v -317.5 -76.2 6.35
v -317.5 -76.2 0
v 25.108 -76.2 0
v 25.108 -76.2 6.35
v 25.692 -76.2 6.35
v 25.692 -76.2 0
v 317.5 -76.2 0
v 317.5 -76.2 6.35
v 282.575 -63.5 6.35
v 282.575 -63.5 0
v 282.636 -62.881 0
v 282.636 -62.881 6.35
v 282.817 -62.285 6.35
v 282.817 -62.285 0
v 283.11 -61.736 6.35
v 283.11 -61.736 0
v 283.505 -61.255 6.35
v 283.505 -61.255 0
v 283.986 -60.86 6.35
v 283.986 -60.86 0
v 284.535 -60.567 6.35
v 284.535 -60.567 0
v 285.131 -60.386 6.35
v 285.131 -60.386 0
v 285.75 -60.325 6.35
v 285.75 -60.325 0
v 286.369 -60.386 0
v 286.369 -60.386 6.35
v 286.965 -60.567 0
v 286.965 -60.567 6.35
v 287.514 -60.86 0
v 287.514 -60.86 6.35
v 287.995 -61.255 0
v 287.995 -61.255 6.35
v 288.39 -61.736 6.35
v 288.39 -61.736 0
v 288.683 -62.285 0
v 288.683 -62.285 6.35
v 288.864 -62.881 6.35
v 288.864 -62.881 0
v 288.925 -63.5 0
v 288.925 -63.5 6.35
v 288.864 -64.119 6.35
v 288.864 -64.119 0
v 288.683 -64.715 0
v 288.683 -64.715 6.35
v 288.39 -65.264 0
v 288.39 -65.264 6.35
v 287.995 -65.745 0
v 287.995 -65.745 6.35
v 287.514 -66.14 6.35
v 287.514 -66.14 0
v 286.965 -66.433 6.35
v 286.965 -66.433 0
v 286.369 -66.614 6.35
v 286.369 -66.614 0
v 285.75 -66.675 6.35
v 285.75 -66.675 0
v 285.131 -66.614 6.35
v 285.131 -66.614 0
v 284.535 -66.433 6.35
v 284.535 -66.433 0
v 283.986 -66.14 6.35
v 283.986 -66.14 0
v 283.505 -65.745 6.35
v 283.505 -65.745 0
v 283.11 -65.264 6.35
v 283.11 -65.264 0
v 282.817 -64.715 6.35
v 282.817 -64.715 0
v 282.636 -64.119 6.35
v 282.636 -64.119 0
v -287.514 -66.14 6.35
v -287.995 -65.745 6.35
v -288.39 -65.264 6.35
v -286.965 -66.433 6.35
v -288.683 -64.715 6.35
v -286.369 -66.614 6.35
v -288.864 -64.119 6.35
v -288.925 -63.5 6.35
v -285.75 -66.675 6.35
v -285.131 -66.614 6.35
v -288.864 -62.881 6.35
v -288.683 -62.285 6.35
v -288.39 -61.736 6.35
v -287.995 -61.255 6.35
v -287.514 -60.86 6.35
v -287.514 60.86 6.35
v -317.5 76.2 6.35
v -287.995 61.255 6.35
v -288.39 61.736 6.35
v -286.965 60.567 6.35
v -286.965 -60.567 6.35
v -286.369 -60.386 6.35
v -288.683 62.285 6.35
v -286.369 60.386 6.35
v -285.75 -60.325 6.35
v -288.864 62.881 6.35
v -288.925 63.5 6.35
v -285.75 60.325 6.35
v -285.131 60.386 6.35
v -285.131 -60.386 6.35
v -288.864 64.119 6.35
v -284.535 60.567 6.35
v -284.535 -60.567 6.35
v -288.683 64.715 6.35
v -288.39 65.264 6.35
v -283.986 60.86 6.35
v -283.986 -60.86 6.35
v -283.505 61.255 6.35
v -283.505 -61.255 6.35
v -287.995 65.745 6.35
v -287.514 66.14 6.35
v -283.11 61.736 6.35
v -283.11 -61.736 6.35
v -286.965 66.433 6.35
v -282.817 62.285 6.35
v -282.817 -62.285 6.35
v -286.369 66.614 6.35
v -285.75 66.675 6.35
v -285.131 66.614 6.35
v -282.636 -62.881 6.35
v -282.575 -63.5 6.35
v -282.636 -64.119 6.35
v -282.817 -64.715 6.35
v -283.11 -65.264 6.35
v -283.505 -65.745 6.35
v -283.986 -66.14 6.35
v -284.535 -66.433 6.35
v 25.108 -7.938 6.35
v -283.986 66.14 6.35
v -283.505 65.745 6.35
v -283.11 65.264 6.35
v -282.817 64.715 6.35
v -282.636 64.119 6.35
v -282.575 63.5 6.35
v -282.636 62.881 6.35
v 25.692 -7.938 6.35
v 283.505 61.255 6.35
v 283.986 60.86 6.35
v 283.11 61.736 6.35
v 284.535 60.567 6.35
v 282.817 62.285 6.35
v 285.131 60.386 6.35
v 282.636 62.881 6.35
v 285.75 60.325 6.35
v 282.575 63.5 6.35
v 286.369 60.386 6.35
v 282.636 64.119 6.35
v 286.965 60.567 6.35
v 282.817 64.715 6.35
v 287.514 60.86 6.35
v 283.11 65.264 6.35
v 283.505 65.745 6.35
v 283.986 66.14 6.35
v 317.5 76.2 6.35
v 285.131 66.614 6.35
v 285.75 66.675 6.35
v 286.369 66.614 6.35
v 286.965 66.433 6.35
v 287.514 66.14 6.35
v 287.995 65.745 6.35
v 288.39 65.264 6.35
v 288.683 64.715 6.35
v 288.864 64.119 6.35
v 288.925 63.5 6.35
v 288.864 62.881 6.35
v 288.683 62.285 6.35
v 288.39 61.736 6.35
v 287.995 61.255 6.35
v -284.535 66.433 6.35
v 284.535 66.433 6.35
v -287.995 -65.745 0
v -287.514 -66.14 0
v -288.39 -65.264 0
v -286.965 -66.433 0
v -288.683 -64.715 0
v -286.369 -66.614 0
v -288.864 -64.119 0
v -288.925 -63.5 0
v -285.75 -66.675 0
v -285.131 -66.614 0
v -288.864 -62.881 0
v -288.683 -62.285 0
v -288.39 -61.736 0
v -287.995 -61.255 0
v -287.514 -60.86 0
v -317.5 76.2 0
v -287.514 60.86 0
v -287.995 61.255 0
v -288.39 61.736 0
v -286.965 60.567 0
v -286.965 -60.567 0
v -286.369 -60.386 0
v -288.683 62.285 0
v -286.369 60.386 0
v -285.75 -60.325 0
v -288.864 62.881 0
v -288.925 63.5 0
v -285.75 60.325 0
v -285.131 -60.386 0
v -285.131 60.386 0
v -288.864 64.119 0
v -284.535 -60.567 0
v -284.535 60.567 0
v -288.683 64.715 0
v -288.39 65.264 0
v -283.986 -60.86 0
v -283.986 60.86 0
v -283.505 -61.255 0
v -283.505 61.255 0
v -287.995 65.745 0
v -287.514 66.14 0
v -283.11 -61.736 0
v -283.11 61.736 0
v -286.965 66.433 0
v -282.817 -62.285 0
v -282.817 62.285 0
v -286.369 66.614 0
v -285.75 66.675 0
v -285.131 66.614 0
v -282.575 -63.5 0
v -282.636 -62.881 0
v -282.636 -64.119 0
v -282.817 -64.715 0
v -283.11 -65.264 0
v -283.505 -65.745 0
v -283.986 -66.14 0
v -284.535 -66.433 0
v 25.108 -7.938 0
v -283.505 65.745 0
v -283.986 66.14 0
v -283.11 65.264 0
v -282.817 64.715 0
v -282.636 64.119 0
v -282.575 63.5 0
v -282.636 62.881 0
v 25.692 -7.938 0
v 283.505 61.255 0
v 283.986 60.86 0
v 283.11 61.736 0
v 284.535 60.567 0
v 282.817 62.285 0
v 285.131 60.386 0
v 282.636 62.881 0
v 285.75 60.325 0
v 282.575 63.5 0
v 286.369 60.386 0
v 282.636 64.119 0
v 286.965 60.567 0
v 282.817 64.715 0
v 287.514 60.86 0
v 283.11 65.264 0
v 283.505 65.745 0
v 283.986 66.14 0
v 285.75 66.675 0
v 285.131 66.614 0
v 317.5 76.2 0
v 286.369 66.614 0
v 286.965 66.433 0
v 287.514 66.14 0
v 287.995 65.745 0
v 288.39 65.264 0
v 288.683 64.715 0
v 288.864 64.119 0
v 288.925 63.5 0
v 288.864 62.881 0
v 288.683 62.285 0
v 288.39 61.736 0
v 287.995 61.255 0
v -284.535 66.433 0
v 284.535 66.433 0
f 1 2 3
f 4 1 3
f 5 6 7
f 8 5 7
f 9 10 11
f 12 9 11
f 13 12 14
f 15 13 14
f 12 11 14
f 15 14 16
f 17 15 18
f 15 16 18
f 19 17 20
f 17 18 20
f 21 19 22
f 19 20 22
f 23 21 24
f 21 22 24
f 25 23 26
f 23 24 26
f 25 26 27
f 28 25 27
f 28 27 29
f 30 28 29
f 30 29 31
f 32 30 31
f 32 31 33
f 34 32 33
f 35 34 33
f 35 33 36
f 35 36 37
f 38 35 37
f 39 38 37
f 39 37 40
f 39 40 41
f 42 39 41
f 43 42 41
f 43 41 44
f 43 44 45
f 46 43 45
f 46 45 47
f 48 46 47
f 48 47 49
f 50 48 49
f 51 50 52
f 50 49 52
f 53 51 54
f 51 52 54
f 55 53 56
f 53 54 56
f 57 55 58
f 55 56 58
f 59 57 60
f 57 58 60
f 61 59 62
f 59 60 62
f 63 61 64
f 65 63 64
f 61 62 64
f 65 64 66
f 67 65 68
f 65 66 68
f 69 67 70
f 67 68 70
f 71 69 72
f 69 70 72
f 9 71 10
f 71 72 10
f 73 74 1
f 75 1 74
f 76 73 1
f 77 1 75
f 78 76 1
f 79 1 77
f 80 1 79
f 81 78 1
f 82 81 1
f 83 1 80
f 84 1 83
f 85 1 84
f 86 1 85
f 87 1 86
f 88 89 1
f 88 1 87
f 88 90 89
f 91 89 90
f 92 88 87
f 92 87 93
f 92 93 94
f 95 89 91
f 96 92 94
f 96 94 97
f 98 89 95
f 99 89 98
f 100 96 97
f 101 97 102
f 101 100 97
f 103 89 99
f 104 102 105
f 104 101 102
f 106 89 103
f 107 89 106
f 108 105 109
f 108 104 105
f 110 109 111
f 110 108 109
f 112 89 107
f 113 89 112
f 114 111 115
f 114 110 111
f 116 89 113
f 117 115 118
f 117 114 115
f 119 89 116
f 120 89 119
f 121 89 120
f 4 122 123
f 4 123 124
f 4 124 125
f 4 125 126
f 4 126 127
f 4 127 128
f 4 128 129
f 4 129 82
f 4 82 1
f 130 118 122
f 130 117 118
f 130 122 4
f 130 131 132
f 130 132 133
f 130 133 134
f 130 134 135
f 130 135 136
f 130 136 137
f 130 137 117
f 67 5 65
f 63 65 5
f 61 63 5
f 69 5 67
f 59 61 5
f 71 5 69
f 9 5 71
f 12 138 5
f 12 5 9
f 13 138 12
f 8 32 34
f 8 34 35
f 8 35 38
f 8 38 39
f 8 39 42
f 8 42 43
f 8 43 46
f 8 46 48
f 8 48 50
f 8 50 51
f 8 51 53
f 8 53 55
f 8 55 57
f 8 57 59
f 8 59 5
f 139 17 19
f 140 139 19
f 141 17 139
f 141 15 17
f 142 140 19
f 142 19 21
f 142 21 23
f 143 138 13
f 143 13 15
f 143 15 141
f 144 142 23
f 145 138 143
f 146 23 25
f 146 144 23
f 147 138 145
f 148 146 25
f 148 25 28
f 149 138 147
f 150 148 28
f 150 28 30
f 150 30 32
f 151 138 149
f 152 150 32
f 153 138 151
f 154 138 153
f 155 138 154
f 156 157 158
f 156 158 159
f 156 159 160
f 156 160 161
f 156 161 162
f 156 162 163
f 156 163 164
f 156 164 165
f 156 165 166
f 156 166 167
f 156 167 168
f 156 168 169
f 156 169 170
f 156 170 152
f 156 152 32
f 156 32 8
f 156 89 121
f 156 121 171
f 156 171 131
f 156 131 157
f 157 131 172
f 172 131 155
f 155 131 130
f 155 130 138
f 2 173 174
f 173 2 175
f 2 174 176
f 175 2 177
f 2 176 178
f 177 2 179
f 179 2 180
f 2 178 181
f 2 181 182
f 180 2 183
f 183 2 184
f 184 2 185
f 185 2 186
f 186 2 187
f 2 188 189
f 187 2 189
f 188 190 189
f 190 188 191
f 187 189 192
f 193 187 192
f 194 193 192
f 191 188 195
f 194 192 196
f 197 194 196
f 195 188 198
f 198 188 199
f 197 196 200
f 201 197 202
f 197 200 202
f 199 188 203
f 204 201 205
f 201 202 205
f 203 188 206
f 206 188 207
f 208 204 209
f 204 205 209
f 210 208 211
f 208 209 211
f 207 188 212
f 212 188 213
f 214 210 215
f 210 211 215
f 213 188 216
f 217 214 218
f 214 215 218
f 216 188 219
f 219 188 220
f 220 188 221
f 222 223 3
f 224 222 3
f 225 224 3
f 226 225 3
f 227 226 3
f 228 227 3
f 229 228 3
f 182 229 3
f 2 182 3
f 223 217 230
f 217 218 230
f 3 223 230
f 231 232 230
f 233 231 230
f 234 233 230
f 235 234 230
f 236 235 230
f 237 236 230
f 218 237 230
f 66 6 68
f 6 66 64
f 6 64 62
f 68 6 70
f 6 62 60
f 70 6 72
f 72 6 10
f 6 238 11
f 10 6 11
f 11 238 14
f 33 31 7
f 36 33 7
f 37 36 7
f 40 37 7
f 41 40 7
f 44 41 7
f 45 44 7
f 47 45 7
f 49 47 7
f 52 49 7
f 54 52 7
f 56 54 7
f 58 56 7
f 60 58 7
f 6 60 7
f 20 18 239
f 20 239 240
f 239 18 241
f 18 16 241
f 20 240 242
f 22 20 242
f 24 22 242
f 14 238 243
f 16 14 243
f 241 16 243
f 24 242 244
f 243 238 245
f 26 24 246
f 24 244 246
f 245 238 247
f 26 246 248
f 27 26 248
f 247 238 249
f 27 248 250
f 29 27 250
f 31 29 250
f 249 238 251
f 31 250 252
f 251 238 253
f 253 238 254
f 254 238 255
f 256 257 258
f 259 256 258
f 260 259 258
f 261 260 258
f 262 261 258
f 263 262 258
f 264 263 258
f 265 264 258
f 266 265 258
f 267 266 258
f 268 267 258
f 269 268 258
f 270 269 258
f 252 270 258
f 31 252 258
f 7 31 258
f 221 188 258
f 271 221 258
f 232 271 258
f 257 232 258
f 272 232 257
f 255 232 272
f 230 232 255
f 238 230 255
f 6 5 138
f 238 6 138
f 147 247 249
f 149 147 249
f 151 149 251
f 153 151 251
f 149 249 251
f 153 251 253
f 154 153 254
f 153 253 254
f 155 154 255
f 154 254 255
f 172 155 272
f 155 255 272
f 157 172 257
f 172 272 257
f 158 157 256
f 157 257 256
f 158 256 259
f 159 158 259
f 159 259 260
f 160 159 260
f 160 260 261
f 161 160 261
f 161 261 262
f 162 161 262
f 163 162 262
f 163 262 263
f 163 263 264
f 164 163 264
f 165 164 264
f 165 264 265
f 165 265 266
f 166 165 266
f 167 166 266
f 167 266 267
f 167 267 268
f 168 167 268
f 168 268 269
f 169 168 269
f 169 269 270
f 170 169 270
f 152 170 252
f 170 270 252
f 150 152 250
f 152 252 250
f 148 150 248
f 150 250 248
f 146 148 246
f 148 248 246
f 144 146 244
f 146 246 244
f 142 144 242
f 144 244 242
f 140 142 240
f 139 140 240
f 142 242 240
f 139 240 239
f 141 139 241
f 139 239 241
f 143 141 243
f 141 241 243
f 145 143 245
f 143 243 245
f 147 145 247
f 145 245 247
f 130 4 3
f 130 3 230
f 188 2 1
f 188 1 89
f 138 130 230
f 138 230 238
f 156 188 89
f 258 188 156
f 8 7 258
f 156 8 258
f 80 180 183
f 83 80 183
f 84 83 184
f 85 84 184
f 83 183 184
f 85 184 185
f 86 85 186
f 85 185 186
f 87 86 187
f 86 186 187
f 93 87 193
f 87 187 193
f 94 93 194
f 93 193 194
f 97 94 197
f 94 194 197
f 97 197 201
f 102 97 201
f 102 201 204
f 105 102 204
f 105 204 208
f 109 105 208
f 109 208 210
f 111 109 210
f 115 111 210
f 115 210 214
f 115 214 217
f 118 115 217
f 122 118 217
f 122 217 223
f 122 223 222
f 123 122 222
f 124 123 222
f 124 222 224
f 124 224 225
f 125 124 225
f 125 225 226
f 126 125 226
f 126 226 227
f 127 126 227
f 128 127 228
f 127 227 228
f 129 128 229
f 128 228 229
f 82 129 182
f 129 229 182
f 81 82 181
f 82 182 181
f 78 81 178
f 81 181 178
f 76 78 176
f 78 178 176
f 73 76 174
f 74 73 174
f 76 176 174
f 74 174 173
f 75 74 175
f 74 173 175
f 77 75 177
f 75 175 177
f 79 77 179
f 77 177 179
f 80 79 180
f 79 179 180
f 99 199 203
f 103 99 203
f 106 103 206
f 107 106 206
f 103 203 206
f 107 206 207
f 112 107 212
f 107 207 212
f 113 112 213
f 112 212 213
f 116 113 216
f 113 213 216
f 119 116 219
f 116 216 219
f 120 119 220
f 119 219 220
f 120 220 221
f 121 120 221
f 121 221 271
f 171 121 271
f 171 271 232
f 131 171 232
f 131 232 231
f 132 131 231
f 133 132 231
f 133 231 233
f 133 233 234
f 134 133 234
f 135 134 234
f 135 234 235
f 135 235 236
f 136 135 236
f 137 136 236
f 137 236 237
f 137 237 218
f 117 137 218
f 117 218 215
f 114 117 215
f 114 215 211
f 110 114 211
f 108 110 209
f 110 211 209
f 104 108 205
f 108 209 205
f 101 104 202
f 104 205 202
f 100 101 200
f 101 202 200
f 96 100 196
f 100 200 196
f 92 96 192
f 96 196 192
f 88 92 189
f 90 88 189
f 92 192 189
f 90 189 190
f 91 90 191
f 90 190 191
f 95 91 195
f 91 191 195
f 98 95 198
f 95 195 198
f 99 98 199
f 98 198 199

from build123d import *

# Parameters (mm, degrees)
F0_W     = 635
F0_H     = 152.4
F1_DEPTH = 6.35
F3_D     = 6.35
F4_W     = 0.5842
F4_H     = 68.2625
F5_DEPTH = 25.4


with BuildPart() as f1:
    # F0 (on Top) → F1 (new body)
    with BuildSketch(Plane.XY):
        Rectangle(F0_W, F0_H)
    extrude(amount=F1_DEPTH)

    # F3 (through all)
    with Locations(Plane.XY.offset(6.35)):
        with Locations((-285.75, 63.5), (-285.75, -63.5), (285.75, -63.5), (285.75, 63.5)):
            Hole(F3_D / 2)

    # F4 (on face) → F5 (cut)
    with BuildSketch(Plane.XY.offset(6.35)):
        with Locations((25.4, -42.06875)):
            Rectangle(F4_W, F4_H)
    extrude(amount=-F5_DEPTH, mode=Mode.SUBTRACT)


solid = f1.part
